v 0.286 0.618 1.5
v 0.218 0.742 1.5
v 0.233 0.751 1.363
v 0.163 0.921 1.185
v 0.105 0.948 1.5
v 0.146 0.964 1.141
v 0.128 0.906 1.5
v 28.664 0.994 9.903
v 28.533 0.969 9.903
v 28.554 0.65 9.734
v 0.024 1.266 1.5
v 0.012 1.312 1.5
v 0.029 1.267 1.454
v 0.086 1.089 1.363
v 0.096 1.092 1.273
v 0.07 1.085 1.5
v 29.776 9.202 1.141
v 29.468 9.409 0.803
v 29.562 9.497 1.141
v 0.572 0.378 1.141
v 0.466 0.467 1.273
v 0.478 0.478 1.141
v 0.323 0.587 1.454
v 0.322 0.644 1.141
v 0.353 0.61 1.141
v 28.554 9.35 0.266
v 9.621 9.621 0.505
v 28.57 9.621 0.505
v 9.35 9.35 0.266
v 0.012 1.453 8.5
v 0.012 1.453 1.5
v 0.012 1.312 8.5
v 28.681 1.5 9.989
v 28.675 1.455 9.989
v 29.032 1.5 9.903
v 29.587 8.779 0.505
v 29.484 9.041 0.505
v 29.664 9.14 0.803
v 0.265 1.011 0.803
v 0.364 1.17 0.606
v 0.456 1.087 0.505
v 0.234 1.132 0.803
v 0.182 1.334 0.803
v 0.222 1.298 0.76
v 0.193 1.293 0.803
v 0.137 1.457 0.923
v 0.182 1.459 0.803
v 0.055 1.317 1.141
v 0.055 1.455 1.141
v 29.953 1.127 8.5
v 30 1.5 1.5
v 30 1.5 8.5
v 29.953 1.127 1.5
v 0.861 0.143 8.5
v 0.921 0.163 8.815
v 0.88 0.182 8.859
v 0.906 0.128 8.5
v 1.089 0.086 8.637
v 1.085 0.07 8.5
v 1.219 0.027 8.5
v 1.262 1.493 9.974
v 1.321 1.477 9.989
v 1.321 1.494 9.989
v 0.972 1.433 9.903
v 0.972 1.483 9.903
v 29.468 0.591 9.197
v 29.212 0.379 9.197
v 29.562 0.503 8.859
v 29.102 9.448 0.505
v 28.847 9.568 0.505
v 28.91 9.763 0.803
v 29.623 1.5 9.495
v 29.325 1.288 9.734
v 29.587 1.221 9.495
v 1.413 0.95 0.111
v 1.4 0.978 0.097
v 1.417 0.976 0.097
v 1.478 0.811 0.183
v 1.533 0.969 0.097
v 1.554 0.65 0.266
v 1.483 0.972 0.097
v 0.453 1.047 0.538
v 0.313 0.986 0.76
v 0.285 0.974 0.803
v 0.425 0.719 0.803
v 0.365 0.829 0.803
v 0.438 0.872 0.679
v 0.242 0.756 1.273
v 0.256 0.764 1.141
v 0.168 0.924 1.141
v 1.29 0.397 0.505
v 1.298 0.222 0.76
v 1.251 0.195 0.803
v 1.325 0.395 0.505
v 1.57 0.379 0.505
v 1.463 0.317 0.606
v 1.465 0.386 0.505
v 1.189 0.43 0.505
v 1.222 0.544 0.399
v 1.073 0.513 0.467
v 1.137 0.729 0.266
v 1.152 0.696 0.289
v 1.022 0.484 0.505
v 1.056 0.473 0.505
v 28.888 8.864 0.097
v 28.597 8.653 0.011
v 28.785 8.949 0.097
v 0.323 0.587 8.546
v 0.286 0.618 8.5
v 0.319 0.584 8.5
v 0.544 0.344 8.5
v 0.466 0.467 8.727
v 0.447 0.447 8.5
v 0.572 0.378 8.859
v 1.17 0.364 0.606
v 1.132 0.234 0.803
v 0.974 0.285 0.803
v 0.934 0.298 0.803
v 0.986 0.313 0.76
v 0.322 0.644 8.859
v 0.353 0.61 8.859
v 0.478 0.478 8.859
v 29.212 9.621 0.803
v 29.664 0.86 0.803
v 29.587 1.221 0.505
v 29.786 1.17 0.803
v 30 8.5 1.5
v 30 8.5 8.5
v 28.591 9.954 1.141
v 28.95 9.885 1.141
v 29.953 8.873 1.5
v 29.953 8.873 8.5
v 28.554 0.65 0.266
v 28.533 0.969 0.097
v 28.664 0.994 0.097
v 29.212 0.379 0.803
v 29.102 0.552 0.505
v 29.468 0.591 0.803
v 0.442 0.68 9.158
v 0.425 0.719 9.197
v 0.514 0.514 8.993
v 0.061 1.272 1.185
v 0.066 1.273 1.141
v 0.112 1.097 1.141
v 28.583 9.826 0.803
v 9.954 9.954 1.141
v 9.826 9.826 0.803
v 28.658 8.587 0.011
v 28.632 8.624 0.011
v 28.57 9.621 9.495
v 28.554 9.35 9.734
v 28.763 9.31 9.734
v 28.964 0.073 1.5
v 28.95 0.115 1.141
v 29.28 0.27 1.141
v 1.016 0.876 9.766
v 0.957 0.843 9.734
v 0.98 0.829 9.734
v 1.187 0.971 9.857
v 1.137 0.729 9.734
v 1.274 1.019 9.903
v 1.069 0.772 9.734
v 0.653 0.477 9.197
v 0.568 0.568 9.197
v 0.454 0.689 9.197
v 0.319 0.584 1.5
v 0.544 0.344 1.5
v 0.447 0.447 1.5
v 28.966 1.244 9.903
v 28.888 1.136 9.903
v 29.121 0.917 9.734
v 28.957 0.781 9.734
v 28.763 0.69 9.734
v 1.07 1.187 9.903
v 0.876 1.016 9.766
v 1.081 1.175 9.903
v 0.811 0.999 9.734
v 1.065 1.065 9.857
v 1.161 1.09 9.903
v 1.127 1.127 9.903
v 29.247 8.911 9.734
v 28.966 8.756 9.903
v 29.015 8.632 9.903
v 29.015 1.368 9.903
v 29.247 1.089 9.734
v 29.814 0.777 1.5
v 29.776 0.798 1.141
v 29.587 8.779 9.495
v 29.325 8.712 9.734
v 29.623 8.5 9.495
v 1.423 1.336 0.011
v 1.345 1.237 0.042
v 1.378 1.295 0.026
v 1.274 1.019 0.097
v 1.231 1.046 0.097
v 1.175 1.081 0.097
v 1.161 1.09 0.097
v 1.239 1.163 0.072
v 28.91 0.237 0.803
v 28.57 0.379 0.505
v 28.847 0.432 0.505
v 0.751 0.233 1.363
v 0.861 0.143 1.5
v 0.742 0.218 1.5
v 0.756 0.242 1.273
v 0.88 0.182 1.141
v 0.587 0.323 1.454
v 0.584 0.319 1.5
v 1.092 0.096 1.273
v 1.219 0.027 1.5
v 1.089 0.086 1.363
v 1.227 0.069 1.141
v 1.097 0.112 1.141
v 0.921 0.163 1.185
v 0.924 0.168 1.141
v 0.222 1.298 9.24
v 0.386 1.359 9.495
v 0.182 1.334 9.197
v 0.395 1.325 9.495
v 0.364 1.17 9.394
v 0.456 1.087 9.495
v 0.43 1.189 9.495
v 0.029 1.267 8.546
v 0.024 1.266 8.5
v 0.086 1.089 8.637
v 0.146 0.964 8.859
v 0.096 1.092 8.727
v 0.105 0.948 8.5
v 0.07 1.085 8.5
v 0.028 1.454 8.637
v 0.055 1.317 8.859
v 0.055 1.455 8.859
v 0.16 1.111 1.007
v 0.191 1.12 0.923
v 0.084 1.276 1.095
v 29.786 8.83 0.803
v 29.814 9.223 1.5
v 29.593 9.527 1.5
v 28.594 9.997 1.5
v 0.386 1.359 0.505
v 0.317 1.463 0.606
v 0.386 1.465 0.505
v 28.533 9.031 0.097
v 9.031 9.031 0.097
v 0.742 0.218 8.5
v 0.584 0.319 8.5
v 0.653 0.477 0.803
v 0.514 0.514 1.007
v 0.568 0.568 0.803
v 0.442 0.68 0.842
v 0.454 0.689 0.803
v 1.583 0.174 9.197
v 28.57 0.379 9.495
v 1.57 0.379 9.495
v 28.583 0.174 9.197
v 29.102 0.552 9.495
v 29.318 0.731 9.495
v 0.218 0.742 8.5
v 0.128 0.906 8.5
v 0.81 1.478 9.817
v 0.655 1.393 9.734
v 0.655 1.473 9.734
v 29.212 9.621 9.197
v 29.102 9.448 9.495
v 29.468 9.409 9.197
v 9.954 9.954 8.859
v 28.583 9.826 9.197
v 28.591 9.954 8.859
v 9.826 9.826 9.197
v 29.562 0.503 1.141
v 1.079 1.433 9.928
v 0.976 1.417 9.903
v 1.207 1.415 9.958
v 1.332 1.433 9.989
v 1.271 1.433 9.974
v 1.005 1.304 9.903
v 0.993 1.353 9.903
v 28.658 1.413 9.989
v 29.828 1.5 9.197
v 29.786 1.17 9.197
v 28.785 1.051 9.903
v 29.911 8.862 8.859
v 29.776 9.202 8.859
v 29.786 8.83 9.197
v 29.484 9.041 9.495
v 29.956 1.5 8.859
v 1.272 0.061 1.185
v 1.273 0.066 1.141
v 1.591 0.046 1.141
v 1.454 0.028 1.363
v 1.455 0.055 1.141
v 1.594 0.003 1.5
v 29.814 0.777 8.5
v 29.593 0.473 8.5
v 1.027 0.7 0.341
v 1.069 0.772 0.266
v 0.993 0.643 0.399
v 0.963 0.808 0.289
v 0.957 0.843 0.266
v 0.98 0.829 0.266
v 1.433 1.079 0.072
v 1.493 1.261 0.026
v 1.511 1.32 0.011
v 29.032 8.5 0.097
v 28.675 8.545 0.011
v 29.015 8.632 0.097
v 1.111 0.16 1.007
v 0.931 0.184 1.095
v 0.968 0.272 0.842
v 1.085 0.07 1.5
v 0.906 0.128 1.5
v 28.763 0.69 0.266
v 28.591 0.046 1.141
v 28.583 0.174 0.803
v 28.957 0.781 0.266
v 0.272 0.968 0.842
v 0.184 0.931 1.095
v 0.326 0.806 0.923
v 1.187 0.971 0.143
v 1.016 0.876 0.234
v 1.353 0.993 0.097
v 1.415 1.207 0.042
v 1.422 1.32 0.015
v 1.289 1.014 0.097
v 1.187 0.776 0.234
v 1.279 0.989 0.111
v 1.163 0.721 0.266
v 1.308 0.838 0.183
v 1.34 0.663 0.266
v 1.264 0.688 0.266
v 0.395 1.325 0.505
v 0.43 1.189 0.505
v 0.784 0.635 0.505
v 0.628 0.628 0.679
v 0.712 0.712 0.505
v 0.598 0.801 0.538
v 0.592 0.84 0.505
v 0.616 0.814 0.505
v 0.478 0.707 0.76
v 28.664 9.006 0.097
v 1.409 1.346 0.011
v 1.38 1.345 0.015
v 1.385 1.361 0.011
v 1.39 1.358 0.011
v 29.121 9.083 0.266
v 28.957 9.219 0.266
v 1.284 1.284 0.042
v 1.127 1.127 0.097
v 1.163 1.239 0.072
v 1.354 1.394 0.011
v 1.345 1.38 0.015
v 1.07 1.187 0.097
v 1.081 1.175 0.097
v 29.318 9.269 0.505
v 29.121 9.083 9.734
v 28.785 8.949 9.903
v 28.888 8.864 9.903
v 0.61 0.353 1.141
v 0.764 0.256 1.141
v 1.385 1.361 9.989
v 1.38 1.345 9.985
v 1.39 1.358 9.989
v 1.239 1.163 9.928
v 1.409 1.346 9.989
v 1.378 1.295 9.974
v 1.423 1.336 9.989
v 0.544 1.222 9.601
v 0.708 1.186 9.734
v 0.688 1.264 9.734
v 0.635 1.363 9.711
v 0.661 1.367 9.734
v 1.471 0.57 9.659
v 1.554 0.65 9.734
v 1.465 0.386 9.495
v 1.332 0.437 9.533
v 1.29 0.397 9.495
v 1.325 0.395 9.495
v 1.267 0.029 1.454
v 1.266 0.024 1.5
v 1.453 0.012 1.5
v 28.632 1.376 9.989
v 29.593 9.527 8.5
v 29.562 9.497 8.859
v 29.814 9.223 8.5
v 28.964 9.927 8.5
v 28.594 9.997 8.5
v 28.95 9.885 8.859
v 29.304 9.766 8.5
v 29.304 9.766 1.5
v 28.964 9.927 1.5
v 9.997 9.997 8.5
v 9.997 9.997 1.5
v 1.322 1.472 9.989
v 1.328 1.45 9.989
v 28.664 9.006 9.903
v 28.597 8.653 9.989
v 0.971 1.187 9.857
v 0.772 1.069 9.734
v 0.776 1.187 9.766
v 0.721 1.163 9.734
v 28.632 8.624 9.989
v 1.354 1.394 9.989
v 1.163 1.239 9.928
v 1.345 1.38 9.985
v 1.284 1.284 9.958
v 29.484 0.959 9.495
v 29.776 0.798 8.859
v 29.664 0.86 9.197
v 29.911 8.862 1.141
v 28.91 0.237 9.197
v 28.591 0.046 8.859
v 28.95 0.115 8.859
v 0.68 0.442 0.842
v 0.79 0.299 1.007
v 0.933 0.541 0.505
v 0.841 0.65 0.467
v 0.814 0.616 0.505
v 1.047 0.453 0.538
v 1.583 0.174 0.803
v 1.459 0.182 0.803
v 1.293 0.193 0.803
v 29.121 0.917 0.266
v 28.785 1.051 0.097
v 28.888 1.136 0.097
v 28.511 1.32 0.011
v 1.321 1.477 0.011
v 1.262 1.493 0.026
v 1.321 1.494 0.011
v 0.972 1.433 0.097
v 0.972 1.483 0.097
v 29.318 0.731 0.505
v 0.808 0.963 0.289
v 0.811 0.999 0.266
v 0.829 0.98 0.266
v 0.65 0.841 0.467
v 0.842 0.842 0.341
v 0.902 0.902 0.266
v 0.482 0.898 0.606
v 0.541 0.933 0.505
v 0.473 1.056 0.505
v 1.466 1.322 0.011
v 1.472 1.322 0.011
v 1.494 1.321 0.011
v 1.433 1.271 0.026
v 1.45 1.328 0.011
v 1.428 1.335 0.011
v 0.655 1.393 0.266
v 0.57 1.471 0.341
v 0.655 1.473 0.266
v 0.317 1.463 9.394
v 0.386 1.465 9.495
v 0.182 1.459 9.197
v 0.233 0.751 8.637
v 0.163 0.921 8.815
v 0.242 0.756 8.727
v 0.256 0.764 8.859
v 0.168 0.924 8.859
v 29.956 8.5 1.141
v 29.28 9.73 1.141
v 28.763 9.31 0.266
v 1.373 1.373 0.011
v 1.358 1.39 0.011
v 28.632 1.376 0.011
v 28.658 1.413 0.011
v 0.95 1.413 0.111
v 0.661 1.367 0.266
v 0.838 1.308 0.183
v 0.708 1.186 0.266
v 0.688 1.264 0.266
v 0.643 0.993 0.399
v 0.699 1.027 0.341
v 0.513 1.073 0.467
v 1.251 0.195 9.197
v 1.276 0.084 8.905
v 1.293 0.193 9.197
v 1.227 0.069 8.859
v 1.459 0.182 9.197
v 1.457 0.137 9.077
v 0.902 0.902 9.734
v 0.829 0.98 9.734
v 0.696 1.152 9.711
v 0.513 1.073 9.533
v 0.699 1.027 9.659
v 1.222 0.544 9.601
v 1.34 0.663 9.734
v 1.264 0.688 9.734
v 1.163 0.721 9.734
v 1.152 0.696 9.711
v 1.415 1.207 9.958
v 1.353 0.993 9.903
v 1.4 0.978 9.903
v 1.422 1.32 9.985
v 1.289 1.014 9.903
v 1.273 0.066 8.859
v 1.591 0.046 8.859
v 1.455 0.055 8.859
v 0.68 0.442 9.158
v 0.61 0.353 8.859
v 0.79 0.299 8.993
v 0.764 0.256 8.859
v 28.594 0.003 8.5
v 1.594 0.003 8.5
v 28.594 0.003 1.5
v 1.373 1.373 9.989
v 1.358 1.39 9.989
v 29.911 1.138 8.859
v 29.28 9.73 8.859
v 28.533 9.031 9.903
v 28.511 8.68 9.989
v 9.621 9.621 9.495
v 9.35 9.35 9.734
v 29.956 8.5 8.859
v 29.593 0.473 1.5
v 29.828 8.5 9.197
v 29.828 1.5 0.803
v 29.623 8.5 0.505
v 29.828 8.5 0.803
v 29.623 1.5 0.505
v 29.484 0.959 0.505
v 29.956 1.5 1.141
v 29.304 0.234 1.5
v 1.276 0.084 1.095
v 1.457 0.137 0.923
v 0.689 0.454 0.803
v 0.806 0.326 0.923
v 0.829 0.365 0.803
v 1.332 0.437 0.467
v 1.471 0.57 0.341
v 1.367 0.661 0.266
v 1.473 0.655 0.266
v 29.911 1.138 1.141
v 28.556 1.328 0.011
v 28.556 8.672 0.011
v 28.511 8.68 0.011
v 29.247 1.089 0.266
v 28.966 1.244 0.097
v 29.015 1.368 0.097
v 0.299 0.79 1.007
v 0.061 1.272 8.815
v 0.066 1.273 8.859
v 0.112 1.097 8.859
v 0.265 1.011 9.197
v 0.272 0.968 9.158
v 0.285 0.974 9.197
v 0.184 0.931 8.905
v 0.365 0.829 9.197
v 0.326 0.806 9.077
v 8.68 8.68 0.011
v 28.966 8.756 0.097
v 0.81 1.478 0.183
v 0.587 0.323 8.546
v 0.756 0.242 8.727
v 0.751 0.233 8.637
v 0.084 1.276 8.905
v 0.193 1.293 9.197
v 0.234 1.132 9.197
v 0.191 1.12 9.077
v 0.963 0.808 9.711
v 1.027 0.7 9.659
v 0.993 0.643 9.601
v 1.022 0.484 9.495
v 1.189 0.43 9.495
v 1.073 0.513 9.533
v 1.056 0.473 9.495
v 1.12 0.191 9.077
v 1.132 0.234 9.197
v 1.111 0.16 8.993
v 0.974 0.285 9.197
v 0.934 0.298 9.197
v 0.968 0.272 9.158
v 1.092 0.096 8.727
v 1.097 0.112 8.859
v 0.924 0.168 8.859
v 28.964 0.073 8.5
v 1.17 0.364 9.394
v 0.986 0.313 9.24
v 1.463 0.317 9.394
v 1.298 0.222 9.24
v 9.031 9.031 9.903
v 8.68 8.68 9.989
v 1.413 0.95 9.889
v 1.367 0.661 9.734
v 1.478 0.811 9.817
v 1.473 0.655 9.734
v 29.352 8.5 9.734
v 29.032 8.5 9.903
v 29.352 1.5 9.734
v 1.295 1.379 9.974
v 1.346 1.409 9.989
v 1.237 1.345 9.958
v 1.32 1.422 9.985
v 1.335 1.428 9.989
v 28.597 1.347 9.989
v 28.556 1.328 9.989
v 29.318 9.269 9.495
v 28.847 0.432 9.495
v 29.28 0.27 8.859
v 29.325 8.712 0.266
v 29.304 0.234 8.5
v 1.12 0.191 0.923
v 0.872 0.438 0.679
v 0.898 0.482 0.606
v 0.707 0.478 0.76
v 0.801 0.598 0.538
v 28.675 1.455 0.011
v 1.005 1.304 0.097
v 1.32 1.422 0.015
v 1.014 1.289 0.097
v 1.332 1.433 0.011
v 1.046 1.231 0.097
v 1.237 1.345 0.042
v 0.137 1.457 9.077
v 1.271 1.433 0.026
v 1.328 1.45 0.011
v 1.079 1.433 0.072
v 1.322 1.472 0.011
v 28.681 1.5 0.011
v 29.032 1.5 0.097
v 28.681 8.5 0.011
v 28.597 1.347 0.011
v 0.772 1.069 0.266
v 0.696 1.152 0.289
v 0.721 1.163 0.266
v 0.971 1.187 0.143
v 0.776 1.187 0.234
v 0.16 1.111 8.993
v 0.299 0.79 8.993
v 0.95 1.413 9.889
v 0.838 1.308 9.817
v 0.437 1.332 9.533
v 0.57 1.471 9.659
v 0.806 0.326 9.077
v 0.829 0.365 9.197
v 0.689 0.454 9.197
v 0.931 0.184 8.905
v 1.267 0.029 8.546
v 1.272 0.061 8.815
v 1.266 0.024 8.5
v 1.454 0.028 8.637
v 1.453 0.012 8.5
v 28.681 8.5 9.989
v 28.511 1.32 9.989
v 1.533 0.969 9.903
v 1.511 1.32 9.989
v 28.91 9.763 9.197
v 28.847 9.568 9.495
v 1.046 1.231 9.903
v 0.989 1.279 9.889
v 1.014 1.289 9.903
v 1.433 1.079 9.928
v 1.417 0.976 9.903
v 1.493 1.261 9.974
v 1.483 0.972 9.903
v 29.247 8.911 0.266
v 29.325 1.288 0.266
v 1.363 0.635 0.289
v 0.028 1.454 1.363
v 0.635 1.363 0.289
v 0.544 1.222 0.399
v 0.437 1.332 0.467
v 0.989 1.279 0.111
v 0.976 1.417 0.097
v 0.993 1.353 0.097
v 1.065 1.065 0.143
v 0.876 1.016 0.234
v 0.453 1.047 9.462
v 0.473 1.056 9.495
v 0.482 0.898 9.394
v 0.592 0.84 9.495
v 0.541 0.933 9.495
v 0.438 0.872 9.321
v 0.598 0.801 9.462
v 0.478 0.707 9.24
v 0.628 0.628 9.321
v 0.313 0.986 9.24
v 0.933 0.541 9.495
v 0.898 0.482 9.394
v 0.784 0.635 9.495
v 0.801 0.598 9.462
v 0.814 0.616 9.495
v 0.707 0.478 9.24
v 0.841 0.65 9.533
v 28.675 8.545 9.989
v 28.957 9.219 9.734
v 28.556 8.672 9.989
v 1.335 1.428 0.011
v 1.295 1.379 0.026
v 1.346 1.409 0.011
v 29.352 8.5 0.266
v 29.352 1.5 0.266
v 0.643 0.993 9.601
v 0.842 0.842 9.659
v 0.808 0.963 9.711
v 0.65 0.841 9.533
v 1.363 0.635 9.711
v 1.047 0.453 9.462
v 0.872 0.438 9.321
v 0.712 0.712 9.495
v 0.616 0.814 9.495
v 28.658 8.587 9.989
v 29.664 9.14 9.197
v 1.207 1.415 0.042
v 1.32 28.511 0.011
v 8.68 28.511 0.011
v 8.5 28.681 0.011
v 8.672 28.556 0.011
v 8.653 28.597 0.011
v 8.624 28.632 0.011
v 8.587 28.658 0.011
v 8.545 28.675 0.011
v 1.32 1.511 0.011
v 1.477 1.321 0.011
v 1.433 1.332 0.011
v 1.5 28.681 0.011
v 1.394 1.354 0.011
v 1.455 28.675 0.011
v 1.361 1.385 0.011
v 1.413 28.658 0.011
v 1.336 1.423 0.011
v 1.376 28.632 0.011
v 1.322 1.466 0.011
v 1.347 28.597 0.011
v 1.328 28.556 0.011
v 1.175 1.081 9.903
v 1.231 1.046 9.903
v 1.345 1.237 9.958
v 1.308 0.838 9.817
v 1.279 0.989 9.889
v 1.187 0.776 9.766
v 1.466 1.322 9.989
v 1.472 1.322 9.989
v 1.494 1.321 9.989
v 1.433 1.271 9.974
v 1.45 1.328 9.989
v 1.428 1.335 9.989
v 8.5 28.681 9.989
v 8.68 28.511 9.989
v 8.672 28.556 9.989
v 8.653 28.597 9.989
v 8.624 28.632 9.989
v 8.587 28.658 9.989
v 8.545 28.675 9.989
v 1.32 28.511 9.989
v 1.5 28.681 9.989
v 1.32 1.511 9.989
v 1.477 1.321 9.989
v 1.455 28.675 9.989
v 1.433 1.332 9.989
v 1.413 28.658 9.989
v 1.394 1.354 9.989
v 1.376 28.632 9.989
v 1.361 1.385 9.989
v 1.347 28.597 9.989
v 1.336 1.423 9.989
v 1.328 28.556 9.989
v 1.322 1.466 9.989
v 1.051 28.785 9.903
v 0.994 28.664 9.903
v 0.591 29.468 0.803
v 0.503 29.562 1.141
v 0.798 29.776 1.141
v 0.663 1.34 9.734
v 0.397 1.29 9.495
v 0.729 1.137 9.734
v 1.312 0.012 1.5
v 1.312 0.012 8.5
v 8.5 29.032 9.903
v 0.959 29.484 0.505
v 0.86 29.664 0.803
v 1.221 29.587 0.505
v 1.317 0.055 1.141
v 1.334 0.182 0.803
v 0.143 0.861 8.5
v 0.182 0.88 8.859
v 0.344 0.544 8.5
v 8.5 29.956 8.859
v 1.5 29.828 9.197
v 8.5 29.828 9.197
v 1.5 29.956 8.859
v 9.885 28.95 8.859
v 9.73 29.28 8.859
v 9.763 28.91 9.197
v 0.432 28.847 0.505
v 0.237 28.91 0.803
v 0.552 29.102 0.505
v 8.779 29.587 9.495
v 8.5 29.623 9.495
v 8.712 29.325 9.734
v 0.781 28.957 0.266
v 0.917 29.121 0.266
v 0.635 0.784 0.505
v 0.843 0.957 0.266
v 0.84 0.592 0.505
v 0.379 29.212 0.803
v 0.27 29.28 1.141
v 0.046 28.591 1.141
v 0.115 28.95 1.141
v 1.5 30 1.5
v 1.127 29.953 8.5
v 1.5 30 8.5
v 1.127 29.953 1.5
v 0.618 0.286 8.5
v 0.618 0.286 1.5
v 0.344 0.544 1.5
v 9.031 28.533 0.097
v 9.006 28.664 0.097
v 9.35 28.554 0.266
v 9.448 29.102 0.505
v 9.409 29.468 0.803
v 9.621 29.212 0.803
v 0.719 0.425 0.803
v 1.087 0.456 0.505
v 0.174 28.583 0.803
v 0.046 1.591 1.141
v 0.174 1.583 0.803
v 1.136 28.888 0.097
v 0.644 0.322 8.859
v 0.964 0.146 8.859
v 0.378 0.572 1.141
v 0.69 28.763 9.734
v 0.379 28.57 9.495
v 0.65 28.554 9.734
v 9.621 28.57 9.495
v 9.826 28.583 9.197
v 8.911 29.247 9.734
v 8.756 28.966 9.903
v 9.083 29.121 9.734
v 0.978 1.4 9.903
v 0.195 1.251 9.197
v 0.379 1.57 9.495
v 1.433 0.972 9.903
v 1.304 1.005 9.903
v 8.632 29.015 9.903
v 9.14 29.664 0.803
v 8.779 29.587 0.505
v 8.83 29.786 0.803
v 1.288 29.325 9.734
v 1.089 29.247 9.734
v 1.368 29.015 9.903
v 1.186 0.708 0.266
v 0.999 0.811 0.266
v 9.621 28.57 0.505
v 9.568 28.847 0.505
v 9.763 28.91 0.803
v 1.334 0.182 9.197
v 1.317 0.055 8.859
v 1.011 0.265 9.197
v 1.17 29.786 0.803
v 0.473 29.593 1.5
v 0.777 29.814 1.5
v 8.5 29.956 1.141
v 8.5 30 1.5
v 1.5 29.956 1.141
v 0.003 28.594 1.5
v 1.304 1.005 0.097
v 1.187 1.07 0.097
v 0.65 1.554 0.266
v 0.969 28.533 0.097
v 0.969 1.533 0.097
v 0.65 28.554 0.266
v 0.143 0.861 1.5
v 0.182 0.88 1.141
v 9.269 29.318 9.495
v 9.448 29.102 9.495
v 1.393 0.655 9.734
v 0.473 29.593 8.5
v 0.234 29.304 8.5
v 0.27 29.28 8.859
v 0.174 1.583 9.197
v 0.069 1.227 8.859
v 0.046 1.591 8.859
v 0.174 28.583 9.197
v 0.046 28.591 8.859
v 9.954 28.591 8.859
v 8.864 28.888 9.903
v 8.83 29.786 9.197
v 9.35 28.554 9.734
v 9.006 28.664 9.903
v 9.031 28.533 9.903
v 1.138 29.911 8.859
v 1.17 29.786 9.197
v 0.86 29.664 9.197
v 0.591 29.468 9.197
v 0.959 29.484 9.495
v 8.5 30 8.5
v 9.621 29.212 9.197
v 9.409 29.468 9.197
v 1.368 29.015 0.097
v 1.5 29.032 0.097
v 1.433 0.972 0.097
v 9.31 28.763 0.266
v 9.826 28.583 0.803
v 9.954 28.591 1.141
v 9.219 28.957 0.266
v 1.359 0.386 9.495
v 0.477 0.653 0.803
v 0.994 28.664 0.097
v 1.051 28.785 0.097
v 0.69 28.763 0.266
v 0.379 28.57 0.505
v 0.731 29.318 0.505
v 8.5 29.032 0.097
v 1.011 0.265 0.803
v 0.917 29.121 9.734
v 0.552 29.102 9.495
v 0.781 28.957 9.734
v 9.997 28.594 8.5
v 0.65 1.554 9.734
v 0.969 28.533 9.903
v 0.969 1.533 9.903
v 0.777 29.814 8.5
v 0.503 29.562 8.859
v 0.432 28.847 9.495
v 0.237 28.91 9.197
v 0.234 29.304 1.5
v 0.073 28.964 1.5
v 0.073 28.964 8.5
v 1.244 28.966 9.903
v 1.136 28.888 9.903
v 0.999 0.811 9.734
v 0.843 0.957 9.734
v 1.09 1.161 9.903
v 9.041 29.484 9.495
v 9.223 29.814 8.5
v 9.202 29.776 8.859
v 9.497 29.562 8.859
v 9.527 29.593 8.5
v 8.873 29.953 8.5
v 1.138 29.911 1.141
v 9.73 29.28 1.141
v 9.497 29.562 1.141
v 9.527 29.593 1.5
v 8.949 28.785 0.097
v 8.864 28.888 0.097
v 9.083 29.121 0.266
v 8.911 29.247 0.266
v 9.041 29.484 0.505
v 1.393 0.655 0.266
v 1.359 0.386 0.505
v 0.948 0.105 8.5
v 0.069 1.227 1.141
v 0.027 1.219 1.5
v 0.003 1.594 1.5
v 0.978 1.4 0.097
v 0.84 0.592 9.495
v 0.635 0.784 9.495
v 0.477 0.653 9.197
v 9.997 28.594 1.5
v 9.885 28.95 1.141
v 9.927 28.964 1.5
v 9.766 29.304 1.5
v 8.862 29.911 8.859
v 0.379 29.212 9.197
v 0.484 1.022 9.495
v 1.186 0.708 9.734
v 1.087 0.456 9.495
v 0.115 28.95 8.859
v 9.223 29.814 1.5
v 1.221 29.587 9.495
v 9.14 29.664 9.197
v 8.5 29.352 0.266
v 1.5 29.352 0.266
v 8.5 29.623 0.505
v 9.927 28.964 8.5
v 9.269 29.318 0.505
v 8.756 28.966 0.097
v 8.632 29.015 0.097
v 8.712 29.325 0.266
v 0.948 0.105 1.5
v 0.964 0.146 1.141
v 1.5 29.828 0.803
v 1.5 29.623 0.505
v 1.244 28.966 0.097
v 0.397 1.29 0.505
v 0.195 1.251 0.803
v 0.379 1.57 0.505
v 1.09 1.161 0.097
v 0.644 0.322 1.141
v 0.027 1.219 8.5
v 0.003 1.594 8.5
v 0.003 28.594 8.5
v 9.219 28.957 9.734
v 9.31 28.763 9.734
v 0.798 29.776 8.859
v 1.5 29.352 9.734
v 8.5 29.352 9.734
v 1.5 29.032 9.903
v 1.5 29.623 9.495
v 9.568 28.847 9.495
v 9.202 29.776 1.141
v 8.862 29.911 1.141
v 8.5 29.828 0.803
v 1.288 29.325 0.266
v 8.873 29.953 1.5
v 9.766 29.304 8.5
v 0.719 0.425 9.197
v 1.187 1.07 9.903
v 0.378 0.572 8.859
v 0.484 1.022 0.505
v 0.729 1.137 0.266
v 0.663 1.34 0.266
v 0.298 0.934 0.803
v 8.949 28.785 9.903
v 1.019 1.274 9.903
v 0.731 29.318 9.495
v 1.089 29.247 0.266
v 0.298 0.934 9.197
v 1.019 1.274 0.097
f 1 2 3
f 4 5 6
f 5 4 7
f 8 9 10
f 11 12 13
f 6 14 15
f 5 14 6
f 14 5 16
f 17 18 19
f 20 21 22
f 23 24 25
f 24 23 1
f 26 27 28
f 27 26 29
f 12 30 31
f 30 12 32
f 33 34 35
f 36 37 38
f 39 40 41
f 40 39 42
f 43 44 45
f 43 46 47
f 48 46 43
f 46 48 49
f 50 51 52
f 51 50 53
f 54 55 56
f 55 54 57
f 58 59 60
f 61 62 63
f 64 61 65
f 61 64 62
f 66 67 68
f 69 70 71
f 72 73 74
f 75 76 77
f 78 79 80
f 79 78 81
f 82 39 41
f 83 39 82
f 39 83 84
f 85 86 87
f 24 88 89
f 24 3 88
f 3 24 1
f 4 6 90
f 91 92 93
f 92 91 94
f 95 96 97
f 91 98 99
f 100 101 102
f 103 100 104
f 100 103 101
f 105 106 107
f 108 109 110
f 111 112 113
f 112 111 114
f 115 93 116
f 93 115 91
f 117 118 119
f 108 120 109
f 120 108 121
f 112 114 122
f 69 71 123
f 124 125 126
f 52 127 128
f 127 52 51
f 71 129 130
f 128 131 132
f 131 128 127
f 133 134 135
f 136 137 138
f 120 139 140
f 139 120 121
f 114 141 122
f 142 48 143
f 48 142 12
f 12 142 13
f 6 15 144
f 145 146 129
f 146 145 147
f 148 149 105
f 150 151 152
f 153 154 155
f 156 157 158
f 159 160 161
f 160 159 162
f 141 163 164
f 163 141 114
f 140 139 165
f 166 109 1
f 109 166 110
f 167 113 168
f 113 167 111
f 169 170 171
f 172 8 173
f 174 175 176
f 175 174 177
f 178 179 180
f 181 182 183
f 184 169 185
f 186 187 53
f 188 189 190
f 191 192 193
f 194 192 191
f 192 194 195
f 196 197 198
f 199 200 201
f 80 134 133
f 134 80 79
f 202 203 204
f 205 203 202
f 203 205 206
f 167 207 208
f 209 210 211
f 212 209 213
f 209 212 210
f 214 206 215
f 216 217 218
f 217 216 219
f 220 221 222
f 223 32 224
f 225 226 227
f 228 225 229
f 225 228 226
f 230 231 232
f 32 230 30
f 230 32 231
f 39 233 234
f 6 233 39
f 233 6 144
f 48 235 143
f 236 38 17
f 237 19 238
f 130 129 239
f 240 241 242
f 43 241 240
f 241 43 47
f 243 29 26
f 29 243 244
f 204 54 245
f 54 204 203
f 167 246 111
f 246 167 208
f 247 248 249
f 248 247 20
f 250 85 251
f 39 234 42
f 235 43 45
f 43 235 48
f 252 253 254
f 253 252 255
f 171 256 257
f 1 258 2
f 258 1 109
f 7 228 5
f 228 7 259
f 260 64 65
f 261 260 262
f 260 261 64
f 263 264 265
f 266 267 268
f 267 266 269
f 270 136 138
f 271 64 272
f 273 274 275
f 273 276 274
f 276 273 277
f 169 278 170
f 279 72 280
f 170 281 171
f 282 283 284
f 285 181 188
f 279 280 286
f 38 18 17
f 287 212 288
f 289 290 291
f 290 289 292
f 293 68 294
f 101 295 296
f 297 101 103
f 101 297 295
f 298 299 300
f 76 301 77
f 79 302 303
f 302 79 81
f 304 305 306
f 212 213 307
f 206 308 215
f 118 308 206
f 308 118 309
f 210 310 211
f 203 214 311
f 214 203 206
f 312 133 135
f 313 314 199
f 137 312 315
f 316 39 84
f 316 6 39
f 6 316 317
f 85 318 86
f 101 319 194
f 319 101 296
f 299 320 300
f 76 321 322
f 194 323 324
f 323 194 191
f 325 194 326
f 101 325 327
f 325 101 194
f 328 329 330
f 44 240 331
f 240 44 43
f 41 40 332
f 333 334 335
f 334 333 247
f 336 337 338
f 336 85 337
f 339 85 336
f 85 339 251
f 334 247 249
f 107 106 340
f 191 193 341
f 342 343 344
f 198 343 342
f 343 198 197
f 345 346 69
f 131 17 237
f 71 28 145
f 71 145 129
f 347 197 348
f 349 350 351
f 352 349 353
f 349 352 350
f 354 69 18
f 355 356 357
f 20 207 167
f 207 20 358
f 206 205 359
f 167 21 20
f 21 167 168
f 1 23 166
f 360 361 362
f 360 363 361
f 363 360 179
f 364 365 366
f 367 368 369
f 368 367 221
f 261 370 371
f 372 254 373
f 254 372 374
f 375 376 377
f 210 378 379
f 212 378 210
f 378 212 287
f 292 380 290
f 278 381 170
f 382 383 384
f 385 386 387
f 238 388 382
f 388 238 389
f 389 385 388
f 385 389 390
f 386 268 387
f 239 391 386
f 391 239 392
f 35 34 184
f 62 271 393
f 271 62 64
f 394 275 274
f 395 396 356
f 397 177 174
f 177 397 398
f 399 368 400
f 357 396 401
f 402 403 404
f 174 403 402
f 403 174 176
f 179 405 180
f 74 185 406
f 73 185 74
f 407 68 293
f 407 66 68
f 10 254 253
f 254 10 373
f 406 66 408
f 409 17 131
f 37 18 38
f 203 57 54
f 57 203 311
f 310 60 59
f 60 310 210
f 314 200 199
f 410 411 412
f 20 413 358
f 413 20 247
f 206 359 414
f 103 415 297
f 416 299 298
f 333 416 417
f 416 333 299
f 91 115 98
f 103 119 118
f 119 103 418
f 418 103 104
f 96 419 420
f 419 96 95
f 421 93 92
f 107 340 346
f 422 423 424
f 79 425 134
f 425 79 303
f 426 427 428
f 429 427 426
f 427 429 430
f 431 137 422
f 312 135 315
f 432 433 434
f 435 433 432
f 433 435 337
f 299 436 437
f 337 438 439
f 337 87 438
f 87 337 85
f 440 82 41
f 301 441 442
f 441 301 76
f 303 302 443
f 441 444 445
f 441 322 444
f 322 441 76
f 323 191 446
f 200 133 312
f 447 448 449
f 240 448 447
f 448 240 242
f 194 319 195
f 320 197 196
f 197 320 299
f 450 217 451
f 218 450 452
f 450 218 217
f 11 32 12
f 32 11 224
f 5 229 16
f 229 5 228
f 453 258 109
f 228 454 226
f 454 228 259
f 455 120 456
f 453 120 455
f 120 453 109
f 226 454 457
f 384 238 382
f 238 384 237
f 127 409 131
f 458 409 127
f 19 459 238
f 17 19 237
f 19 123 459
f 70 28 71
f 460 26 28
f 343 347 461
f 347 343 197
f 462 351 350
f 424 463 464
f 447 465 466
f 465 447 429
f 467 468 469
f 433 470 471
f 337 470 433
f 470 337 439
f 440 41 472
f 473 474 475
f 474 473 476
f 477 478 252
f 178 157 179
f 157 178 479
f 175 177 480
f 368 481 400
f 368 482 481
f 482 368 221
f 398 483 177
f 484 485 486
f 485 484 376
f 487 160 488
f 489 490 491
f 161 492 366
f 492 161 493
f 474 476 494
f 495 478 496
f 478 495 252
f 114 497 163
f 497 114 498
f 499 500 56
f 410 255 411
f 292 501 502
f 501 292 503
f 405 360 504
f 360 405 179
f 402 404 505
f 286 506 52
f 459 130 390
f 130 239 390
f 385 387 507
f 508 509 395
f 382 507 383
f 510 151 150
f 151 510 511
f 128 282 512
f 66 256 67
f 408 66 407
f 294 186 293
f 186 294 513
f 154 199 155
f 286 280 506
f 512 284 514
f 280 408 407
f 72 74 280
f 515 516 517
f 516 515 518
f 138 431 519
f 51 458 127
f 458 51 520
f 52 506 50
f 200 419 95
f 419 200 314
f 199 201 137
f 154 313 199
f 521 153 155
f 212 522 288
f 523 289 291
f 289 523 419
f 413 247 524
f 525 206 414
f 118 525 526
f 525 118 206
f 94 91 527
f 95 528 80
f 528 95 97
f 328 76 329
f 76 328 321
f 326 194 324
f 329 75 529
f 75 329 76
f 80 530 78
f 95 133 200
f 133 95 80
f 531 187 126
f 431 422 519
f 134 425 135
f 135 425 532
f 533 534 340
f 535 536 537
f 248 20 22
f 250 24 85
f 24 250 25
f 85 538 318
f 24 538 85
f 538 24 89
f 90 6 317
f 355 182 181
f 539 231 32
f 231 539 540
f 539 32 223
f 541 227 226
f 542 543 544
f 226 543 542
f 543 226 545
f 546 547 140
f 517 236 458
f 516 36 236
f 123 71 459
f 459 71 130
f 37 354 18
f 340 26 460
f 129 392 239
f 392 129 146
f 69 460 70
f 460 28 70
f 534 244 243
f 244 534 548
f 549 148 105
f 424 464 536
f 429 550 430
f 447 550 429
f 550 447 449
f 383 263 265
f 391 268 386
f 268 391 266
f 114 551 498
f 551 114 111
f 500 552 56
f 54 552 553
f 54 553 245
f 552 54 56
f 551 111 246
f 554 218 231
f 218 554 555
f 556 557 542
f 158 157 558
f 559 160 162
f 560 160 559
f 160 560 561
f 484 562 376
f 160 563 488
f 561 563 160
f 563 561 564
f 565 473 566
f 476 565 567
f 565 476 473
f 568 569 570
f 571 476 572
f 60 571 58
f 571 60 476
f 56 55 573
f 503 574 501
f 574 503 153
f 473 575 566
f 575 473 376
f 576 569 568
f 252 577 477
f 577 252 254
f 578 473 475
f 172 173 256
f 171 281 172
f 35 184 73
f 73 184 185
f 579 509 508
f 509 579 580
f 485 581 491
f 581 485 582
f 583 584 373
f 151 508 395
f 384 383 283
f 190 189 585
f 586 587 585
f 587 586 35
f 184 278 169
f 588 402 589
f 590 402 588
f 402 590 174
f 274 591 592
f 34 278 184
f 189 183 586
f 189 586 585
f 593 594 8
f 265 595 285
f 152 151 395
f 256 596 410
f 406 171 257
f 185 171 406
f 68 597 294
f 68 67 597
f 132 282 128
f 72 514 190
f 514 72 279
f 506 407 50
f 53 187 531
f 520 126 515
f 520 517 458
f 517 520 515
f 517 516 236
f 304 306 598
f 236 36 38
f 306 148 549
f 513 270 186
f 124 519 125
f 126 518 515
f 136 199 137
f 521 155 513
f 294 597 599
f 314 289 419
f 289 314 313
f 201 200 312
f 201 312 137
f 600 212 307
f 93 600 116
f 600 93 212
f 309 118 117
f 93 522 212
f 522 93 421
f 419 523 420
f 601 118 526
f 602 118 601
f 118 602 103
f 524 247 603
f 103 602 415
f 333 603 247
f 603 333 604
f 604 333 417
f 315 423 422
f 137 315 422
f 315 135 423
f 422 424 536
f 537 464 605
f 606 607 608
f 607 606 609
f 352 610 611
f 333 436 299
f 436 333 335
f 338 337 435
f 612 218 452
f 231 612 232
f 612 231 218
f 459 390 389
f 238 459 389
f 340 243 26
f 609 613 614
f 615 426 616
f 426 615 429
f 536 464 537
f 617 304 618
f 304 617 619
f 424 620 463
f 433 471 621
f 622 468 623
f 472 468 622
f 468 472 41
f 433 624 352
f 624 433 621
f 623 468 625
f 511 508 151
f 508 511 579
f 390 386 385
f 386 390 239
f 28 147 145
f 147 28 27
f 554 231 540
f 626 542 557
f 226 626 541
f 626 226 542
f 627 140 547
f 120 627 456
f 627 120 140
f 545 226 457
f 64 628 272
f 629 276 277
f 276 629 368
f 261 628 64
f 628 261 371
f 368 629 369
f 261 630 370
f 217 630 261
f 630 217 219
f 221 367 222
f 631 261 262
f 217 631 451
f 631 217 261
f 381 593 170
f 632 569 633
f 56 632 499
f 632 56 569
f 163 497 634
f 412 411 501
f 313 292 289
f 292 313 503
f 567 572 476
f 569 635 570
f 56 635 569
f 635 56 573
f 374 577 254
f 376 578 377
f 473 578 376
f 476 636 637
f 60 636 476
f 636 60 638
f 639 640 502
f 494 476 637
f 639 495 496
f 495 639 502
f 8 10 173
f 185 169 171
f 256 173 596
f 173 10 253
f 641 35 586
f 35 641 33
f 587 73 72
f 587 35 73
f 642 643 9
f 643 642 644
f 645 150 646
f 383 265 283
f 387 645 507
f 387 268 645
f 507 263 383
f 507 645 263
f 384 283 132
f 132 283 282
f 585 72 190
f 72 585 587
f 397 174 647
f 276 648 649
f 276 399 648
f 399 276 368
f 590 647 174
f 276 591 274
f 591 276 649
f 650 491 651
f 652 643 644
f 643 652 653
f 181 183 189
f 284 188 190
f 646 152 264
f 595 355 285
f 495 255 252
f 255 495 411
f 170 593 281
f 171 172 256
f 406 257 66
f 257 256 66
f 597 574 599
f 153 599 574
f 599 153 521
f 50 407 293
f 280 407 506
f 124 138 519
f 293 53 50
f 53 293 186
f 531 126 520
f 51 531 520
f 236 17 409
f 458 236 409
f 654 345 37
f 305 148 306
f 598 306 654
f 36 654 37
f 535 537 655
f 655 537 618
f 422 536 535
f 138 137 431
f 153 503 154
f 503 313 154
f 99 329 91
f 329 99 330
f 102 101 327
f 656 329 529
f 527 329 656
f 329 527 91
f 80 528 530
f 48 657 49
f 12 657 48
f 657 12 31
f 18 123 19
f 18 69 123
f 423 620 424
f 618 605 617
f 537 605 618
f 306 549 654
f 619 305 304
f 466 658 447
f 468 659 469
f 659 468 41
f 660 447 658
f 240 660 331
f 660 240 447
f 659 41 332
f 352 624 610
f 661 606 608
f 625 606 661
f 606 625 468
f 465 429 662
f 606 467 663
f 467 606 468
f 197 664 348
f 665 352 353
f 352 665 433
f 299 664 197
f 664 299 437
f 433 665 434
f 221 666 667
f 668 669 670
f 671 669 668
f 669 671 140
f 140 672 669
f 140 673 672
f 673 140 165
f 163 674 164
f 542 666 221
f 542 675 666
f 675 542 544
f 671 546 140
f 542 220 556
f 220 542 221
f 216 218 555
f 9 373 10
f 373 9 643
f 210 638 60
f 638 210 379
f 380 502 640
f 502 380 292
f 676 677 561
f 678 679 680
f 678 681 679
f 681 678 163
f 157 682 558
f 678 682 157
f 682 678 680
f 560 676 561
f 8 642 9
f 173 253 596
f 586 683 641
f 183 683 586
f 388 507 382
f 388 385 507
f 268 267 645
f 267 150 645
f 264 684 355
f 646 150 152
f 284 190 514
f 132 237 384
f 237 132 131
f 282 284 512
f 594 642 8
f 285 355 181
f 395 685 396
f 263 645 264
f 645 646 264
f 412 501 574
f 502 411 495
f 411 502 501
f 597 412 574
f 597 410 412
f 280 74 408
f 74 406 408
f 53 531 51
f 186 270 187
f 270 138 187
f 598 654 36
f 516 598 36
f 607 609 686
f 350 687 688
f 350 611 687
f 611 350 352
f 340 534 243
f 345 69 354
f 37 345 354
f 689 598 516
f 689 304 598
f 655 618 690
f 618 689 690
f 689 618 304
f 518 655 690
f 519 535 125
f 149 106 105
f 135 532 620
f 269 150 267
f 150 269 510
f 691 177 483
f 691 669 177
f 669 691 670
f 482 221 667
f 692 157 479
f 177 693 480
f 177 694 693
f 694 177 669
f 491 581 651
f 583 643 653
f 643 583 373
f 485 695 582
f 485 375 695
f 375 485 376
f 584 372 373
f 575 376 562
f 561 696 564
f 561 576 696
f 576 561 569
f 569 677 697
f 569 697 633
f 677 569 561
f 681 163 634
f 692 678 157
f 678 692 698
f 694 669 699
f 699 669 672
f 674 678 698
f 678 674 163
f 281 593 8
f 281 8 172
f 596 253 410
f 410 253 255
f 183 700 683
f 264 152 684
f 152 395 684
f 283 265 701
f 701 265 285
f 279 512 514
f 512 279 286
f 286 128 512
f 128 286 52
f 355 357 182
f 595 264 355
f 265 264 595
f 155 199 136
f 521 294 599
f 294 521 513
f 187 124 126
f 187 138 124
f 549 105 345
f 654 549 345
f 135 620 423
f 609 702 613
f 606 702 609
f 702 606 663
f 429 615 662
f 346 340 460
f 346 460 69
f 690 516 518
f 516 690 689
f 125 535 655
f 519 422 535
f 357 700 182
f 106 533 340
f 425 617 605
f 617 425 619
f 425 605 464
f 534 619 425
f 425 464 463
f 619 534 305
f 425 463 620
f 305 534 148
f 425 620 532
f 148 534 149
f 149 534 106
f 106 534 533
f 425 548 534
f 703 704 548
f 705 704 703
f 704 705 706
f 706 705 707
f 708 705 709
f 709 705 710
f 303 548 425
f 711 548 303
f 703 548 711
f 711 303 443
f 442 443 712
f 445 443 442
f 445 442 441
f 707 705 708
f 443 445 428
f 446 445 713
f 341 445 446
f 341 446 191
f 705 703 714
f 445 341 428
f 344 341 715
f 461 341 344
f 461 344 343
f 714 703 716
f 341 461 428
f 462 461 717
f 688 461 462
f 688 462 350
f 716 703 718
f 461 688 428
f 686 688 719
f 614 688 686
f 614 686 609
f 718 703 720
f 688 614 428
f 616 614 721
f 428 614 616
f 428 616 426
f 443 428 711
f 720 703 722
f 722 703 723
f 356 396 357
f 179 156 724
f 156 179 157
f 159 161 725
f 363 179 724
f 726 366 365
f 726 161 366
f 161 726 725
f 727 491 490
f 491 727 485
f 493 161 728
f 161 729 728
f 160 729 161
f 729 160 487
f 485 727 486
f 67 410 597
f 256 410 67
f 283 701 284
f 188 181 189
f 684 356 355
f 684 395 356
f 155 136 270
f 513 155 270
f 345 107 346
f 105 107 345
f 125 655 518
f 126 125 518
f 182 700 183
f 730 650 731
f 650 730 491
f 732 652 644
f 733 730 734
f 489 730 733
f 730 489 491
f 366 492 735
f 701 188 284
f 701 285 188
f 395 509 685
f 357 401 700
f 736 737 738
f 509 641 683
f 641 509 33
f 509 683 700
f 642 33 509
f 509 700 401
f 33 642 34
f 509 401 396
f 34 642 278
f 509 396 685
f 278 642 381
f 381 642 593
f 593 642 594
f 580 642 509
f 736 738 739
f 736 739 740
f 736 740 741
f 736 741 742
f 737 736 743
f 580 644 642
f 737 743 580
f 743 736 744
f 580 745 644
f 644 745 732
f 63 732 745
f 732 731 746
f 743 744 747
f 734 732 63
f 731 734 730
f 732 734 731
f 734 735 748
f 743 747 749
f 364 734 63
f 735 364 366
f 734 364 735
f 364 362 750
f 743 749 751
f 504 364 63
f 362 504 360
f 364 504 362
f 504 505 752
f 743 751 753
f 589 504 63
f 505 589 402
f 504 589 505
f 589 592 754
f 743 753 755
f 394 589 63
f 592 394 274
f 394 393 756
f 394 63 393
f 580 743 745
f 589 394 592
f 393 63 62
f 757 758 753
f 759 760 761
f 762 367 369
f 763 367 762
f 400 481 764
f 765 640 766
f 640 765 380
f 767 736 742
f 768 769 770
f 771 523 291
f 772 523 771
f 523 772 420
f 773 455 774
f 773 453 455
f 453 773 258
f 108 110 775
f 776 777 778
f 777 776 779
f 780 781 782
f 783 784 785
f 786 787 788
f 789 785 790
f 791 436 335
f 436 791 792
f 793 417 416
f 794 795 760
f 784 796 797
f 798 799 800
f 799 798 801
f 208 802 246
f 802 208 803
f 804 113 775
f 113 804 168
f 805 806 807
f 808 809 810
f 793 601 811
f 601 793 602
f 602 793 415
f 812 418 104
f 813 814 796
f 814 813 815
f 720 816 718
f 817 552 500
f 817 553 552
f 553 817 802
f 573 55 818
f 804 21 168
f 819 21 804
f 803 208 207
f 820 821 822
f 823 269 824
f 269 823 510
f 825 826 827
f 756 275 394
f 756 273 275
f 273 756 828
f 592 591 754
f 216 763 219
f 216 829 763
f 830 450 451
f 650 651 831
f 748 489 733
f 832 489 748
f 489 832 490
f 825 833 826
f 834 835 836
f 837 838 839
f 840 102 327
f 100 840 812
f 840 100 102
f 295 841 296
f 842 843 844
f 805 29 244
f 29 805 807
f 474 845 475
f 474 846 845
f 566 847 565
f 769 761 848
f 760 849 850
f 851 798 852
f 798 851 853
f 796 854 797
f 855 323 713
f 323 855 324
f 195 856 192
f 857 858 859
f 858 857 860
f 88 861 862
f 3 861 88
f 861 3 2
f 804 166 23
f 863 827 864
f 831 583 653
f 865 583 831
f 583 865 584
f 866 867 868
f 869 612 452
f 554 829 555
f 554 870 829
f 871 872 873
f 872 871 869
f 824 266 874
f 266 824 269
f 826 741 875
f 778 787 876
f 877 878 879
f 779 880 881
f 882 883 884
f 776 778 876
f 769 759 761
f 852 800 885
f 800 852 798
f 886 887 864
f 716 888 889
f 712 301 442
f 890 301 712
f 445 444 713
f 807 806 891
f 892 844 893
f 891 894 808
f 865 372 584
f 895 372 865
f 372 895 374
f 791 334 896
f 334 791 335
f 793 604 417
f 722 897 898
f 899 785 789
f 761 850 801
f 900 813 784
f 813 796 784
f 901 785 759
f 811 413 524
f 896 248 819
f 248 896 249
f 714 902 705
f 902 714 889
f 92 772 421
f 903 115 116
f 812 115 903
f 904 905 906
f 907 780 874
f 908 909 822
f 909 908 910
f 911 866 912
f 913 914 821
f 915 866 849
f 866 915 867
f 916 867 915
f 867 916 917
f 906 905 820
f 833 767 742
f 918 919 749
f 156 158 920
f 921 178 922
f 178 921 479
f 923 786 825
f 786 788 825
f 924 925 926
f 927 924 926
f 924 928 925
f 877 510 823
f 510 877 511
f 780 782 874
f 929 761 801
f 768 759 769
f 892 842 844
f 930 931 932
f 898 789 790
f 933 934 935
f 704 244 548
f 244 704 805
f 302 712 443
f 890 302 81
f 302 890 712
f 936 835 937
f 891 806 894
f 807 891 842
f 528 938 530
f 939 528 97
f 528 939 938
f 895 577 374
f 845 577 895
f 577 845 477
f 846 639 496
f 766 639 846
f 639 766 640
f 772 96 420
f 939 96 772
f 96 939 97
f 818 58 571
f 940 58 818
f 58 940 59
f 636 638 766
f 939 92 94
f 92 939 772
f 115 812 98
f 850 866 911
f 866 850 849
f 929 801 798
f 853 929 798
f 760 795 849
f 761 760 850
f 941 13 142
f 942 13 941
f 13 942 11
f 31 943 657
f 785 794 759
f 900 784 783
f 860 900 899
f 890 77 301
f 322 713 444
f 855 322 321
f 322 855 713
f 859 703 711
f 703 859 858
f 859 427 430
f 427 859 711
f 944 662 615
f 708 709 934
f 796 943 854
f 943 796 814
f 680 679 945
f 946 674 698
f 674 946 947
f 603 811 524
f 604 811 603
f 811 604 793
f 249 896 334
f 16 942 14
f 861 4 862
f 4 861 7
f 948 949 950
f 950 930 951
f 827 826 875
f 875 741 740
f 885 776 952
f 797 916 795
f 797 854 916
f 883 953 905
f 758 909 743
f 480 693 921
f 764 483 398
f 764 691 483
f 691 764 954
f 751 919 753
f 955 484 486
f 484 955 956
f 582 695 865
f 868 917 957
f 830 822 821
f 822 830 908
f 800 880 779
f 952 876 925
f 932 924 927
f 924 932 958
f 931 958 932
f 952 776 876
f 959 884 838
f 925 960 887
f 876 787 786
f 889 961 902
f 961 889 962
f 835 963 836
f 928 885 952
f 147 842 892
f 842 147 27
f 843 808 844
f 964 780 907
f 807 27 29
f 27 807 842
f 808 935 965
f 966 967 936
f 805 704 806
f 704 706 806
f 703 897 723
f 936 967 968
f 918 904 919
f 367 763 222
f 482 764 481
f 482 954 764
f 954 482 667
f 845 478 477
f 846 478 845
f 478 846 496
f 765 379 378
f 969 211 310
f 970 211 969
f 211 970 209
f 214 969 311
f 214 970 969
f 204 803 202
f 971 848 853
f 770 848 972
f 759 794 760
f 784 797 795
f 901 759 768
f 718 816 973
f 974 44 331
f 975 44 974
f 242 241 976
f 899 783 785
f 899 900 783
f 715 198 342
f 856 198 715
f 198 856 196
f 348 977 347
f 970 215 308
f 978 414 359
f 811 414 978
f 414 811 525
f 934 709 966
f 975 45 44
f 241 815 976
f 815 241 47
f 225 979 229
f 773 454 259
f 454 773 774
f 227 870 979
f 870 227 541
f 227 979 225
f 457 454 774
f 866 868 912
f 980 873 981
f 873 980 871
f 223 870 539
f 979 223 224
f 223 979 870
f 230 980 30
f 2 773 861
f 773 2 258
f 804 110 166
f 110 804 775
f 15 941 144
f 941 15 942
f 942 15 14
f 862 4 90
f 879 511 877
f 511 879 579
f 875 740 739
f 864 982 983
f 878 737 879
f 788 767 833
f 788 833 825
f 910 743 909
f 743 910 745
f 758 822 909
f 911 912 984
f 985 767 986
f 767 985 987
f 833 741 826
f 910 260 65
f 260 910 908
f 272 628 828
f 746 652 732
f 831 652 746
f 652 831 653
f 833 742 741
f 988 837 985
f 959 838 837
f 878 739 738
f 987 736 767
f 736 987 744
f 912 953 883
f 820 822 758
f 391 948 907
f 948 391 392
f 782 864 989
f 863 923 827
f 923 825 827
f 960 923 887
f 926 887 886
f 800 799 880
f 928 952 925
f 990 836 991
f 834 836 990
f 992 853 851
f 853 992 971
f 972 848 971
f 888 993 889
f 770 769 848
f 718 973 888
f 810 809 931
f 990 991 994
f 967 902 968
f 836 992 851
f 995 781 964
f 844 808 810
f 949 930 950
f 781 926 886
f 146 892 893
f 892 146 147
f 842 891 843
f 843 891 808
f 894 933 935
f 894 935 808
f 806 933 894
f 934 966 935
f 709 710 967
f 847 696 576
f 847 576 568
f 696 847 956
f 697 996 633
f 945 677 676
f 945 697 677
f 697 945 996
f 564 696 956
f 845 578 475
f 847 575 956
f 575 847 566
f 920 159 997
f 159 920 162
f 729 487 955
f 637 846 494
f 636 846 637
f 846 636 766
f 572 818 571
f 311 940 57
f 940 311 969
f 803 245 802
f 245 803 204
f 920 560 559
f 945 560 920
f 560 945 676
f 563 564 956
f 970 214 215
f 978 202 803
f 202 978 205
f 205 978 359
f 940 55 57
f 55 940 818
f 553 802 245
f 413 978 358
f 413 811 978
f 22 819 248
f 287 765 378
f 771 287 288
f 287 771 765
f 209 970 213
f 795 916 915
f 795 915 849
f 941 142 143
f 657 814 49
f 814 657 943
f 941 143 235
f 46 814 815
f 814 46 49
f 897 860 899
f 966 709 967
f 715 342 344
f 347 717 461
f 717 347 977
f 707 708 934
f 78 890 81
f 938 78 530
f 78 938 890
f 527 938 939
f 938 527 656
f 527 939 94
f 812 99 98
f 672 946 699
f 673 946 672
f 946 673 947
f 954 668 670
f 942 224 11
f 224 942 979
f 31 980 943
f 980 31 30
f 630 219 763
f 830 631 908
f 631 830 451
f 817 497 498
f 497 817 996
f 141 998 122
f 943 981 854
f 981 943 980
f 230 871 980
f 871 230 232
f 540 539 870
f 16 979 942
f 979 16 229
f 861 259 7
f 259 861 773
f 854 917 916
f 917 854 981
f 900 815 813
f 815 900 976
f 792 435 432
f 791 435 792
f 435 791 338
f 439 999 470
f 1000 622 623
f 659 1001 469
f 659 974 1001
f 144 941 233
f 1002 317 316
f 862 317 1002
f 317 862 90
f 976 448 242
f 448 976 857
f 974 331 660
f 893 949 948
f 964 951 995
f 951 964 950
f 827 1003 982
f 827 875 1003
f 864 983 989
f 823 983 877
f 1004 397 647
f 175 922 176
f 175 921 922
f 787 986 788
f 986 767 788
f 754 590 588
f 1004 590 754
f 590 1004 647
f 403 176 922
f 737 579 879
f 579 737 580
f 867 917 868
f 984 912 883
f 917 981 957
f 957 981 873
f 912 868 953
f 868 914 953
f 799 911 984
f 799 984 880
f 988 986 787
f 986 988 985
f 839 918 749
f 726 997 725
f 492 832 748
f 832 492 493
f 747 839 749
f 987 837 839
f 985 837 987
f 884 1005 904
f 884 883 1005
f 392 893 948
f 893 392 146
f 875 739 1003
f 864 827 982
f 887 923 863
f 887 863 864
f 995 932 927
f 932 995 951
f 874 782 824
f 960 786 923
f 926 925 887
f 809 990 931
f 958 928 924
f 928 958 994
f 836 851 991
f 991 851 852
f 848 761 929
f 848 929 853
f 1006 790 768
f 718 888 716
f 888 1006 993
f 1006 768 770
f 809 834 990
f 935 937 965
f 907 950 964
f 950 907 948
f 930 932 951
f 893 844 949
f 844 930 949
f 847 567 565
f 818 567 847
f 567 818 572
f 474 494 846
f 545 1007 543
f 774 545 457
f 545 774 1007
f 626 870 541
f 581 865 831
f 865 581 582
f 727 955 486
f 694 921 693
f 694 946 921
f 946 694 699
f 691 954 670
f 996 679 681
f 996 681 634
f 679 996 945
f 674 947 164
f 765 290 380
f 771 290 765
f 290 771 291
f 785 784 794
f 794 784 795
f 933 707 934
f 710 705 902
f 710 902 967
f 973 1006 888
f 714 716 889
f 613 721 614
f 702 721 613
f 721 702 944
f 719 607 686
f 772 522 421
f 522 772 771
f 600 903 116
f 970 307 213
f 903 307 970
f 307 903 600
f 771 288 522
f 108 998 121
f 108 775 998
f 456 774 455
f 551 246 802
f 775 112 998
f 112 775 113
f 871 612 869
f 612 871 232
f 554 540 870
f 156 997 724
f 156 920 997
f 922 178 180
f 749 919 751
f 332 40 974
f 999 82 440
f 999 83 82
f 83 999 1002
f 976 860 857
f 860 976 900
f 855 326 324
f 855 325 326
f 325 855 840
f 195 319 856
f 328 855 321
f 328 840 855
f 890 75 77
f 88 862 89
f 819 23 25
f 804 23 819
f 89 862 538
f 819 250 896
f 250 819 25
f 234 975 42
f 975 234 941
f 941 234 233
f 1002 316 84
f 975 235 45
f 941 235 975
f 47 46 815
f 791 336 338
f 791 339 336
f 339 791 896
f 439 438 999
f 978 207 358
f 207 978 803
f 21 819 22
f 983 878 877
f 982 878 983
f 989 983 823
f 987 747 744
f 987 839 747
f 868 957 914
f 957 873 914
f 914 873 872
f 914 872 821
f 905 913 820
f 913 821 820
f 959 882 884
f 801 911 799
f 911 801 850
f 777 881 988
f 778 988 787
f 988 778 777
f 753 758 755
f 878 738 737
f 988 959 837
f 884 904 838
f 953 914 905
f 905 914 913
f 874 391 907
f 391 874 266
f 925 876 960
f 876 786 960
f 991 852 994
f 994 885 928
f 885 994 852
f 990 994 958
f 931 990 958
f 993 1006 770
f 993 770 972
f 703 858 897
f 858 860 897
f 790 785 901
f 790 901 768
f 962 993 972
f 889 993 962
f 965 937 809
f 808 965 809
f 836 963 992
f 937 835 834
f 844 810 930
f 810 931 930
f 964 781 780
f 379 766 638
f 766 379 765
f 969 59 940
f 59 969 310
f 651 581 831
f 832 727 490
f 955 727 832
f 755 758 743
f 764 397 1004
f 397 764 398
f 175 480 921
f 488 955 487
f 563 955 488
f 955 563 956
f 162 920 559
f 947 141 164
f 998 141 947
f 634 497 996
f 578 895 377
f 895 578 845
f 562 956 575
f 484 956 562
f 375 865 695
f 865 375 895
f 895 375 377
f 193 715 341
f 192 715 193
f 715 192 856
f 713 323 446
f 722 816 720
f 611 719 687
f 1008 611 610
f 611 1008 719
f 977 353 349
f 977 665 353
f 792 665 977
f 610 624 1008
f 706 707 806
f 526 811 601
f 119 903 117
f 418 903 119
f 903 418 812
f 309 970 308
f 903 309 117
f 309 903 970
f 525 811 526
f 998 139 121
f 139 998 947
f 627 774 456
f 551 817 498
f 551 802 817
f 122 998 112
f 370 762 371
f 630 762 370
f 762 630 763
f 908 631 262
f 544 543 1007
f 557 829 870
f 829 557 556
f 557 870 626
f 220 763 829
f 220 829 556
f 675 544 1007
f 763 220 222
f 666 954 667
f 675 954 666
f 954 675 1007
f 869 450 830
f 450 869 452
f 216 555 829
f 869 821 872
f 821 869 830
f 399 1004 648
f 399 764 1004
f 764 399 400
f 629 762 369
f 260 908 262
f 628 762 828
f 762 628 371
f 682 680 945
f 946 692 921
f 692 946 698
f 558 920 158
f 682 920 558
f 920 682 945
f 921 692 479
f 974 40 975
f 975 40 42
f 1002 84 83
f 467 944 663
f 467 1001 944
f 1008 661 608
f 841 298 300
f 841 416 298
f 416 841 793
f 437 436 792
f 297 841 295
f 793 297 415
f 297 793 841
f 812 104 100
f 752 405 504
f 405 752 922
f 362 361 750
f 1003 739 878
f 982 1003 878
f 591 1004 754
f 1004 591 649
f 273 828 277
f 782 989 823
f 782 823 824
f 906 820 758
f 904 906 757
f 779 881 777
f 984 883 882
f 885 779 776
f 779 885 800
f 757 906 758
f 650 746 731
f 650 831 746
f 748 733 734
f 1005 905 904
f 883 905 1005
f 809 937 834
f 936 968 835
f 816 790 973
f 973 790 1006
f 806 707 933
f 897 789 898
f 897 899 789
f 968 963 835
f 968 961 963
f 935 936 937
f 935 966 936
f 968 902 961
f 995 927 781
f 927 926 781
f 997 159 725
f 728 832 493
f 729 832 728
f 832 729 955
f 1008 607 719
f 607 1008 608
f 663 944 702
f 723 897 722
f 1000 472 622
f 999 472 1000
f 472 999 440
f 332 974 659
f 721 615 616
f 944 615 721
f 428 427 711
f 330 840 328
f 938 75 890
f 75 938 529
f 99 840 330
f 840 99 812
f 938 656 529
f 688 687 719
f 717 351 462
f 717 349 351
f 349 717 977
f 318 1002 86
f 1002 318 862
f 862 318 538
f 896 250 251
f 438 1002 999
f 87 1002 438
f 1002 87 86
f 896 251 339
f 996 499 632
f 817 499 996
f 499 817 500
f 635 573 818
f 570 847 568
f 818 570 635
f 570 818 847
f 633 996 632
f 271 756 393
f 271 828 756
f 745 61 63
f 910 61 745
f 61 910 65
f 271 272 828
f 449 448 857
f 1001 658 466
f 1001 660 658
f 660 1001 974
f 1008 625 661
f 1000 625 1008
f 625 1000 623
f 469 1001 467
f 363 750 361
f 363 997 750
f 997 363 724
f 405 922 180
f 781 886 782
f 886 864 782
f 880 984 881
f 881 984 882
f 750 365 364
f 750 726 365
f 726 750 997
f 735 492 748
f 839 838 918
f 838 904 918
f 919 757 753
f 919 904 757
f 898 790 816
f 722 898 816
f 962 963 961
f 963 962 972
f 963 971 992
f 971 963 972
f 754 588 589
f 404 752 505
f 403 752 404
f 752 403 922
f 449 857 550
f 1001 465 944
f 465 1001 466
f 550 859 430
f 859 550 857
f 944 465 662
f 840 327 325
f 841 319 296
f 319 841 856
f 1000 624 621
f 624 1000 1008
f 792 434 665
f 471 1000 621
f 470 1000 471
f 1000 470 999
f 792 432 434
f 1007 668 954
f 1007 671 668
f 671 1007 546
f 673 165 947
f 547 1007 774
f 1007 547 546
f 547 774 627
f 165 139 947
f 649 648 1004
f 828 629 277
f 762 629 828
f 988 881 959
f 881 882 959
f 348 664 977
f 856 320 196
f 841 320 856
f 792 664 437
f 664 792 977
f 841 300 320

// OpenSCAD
$fn = 25;

// Width of the arms
WIDTH = 10;

// Height of the arms
HEIGHT = 10;

// Length of each arm
LENGTH = 20;

// Rounding radius for all corners
RADIUS = 1.5;



arm();

translate([WIDTH, 0, 0])
rotate([0, 0, 90])
arm();


module arm() {
  rounded_cube([LENGTH + WIDTH, WIDTH, HEIGHT], r=RADIUS);
}

module rounded_cube(dim, r) {
  hull() {
    for(x=[r, dim[0]-r]) {
      for(y=[r, dim[1]-r]) {
        for(z=[r, dim[2]-r]) {
          translate([x, y, z])
          sphere(r);
        }
      }
    }
  }
}
